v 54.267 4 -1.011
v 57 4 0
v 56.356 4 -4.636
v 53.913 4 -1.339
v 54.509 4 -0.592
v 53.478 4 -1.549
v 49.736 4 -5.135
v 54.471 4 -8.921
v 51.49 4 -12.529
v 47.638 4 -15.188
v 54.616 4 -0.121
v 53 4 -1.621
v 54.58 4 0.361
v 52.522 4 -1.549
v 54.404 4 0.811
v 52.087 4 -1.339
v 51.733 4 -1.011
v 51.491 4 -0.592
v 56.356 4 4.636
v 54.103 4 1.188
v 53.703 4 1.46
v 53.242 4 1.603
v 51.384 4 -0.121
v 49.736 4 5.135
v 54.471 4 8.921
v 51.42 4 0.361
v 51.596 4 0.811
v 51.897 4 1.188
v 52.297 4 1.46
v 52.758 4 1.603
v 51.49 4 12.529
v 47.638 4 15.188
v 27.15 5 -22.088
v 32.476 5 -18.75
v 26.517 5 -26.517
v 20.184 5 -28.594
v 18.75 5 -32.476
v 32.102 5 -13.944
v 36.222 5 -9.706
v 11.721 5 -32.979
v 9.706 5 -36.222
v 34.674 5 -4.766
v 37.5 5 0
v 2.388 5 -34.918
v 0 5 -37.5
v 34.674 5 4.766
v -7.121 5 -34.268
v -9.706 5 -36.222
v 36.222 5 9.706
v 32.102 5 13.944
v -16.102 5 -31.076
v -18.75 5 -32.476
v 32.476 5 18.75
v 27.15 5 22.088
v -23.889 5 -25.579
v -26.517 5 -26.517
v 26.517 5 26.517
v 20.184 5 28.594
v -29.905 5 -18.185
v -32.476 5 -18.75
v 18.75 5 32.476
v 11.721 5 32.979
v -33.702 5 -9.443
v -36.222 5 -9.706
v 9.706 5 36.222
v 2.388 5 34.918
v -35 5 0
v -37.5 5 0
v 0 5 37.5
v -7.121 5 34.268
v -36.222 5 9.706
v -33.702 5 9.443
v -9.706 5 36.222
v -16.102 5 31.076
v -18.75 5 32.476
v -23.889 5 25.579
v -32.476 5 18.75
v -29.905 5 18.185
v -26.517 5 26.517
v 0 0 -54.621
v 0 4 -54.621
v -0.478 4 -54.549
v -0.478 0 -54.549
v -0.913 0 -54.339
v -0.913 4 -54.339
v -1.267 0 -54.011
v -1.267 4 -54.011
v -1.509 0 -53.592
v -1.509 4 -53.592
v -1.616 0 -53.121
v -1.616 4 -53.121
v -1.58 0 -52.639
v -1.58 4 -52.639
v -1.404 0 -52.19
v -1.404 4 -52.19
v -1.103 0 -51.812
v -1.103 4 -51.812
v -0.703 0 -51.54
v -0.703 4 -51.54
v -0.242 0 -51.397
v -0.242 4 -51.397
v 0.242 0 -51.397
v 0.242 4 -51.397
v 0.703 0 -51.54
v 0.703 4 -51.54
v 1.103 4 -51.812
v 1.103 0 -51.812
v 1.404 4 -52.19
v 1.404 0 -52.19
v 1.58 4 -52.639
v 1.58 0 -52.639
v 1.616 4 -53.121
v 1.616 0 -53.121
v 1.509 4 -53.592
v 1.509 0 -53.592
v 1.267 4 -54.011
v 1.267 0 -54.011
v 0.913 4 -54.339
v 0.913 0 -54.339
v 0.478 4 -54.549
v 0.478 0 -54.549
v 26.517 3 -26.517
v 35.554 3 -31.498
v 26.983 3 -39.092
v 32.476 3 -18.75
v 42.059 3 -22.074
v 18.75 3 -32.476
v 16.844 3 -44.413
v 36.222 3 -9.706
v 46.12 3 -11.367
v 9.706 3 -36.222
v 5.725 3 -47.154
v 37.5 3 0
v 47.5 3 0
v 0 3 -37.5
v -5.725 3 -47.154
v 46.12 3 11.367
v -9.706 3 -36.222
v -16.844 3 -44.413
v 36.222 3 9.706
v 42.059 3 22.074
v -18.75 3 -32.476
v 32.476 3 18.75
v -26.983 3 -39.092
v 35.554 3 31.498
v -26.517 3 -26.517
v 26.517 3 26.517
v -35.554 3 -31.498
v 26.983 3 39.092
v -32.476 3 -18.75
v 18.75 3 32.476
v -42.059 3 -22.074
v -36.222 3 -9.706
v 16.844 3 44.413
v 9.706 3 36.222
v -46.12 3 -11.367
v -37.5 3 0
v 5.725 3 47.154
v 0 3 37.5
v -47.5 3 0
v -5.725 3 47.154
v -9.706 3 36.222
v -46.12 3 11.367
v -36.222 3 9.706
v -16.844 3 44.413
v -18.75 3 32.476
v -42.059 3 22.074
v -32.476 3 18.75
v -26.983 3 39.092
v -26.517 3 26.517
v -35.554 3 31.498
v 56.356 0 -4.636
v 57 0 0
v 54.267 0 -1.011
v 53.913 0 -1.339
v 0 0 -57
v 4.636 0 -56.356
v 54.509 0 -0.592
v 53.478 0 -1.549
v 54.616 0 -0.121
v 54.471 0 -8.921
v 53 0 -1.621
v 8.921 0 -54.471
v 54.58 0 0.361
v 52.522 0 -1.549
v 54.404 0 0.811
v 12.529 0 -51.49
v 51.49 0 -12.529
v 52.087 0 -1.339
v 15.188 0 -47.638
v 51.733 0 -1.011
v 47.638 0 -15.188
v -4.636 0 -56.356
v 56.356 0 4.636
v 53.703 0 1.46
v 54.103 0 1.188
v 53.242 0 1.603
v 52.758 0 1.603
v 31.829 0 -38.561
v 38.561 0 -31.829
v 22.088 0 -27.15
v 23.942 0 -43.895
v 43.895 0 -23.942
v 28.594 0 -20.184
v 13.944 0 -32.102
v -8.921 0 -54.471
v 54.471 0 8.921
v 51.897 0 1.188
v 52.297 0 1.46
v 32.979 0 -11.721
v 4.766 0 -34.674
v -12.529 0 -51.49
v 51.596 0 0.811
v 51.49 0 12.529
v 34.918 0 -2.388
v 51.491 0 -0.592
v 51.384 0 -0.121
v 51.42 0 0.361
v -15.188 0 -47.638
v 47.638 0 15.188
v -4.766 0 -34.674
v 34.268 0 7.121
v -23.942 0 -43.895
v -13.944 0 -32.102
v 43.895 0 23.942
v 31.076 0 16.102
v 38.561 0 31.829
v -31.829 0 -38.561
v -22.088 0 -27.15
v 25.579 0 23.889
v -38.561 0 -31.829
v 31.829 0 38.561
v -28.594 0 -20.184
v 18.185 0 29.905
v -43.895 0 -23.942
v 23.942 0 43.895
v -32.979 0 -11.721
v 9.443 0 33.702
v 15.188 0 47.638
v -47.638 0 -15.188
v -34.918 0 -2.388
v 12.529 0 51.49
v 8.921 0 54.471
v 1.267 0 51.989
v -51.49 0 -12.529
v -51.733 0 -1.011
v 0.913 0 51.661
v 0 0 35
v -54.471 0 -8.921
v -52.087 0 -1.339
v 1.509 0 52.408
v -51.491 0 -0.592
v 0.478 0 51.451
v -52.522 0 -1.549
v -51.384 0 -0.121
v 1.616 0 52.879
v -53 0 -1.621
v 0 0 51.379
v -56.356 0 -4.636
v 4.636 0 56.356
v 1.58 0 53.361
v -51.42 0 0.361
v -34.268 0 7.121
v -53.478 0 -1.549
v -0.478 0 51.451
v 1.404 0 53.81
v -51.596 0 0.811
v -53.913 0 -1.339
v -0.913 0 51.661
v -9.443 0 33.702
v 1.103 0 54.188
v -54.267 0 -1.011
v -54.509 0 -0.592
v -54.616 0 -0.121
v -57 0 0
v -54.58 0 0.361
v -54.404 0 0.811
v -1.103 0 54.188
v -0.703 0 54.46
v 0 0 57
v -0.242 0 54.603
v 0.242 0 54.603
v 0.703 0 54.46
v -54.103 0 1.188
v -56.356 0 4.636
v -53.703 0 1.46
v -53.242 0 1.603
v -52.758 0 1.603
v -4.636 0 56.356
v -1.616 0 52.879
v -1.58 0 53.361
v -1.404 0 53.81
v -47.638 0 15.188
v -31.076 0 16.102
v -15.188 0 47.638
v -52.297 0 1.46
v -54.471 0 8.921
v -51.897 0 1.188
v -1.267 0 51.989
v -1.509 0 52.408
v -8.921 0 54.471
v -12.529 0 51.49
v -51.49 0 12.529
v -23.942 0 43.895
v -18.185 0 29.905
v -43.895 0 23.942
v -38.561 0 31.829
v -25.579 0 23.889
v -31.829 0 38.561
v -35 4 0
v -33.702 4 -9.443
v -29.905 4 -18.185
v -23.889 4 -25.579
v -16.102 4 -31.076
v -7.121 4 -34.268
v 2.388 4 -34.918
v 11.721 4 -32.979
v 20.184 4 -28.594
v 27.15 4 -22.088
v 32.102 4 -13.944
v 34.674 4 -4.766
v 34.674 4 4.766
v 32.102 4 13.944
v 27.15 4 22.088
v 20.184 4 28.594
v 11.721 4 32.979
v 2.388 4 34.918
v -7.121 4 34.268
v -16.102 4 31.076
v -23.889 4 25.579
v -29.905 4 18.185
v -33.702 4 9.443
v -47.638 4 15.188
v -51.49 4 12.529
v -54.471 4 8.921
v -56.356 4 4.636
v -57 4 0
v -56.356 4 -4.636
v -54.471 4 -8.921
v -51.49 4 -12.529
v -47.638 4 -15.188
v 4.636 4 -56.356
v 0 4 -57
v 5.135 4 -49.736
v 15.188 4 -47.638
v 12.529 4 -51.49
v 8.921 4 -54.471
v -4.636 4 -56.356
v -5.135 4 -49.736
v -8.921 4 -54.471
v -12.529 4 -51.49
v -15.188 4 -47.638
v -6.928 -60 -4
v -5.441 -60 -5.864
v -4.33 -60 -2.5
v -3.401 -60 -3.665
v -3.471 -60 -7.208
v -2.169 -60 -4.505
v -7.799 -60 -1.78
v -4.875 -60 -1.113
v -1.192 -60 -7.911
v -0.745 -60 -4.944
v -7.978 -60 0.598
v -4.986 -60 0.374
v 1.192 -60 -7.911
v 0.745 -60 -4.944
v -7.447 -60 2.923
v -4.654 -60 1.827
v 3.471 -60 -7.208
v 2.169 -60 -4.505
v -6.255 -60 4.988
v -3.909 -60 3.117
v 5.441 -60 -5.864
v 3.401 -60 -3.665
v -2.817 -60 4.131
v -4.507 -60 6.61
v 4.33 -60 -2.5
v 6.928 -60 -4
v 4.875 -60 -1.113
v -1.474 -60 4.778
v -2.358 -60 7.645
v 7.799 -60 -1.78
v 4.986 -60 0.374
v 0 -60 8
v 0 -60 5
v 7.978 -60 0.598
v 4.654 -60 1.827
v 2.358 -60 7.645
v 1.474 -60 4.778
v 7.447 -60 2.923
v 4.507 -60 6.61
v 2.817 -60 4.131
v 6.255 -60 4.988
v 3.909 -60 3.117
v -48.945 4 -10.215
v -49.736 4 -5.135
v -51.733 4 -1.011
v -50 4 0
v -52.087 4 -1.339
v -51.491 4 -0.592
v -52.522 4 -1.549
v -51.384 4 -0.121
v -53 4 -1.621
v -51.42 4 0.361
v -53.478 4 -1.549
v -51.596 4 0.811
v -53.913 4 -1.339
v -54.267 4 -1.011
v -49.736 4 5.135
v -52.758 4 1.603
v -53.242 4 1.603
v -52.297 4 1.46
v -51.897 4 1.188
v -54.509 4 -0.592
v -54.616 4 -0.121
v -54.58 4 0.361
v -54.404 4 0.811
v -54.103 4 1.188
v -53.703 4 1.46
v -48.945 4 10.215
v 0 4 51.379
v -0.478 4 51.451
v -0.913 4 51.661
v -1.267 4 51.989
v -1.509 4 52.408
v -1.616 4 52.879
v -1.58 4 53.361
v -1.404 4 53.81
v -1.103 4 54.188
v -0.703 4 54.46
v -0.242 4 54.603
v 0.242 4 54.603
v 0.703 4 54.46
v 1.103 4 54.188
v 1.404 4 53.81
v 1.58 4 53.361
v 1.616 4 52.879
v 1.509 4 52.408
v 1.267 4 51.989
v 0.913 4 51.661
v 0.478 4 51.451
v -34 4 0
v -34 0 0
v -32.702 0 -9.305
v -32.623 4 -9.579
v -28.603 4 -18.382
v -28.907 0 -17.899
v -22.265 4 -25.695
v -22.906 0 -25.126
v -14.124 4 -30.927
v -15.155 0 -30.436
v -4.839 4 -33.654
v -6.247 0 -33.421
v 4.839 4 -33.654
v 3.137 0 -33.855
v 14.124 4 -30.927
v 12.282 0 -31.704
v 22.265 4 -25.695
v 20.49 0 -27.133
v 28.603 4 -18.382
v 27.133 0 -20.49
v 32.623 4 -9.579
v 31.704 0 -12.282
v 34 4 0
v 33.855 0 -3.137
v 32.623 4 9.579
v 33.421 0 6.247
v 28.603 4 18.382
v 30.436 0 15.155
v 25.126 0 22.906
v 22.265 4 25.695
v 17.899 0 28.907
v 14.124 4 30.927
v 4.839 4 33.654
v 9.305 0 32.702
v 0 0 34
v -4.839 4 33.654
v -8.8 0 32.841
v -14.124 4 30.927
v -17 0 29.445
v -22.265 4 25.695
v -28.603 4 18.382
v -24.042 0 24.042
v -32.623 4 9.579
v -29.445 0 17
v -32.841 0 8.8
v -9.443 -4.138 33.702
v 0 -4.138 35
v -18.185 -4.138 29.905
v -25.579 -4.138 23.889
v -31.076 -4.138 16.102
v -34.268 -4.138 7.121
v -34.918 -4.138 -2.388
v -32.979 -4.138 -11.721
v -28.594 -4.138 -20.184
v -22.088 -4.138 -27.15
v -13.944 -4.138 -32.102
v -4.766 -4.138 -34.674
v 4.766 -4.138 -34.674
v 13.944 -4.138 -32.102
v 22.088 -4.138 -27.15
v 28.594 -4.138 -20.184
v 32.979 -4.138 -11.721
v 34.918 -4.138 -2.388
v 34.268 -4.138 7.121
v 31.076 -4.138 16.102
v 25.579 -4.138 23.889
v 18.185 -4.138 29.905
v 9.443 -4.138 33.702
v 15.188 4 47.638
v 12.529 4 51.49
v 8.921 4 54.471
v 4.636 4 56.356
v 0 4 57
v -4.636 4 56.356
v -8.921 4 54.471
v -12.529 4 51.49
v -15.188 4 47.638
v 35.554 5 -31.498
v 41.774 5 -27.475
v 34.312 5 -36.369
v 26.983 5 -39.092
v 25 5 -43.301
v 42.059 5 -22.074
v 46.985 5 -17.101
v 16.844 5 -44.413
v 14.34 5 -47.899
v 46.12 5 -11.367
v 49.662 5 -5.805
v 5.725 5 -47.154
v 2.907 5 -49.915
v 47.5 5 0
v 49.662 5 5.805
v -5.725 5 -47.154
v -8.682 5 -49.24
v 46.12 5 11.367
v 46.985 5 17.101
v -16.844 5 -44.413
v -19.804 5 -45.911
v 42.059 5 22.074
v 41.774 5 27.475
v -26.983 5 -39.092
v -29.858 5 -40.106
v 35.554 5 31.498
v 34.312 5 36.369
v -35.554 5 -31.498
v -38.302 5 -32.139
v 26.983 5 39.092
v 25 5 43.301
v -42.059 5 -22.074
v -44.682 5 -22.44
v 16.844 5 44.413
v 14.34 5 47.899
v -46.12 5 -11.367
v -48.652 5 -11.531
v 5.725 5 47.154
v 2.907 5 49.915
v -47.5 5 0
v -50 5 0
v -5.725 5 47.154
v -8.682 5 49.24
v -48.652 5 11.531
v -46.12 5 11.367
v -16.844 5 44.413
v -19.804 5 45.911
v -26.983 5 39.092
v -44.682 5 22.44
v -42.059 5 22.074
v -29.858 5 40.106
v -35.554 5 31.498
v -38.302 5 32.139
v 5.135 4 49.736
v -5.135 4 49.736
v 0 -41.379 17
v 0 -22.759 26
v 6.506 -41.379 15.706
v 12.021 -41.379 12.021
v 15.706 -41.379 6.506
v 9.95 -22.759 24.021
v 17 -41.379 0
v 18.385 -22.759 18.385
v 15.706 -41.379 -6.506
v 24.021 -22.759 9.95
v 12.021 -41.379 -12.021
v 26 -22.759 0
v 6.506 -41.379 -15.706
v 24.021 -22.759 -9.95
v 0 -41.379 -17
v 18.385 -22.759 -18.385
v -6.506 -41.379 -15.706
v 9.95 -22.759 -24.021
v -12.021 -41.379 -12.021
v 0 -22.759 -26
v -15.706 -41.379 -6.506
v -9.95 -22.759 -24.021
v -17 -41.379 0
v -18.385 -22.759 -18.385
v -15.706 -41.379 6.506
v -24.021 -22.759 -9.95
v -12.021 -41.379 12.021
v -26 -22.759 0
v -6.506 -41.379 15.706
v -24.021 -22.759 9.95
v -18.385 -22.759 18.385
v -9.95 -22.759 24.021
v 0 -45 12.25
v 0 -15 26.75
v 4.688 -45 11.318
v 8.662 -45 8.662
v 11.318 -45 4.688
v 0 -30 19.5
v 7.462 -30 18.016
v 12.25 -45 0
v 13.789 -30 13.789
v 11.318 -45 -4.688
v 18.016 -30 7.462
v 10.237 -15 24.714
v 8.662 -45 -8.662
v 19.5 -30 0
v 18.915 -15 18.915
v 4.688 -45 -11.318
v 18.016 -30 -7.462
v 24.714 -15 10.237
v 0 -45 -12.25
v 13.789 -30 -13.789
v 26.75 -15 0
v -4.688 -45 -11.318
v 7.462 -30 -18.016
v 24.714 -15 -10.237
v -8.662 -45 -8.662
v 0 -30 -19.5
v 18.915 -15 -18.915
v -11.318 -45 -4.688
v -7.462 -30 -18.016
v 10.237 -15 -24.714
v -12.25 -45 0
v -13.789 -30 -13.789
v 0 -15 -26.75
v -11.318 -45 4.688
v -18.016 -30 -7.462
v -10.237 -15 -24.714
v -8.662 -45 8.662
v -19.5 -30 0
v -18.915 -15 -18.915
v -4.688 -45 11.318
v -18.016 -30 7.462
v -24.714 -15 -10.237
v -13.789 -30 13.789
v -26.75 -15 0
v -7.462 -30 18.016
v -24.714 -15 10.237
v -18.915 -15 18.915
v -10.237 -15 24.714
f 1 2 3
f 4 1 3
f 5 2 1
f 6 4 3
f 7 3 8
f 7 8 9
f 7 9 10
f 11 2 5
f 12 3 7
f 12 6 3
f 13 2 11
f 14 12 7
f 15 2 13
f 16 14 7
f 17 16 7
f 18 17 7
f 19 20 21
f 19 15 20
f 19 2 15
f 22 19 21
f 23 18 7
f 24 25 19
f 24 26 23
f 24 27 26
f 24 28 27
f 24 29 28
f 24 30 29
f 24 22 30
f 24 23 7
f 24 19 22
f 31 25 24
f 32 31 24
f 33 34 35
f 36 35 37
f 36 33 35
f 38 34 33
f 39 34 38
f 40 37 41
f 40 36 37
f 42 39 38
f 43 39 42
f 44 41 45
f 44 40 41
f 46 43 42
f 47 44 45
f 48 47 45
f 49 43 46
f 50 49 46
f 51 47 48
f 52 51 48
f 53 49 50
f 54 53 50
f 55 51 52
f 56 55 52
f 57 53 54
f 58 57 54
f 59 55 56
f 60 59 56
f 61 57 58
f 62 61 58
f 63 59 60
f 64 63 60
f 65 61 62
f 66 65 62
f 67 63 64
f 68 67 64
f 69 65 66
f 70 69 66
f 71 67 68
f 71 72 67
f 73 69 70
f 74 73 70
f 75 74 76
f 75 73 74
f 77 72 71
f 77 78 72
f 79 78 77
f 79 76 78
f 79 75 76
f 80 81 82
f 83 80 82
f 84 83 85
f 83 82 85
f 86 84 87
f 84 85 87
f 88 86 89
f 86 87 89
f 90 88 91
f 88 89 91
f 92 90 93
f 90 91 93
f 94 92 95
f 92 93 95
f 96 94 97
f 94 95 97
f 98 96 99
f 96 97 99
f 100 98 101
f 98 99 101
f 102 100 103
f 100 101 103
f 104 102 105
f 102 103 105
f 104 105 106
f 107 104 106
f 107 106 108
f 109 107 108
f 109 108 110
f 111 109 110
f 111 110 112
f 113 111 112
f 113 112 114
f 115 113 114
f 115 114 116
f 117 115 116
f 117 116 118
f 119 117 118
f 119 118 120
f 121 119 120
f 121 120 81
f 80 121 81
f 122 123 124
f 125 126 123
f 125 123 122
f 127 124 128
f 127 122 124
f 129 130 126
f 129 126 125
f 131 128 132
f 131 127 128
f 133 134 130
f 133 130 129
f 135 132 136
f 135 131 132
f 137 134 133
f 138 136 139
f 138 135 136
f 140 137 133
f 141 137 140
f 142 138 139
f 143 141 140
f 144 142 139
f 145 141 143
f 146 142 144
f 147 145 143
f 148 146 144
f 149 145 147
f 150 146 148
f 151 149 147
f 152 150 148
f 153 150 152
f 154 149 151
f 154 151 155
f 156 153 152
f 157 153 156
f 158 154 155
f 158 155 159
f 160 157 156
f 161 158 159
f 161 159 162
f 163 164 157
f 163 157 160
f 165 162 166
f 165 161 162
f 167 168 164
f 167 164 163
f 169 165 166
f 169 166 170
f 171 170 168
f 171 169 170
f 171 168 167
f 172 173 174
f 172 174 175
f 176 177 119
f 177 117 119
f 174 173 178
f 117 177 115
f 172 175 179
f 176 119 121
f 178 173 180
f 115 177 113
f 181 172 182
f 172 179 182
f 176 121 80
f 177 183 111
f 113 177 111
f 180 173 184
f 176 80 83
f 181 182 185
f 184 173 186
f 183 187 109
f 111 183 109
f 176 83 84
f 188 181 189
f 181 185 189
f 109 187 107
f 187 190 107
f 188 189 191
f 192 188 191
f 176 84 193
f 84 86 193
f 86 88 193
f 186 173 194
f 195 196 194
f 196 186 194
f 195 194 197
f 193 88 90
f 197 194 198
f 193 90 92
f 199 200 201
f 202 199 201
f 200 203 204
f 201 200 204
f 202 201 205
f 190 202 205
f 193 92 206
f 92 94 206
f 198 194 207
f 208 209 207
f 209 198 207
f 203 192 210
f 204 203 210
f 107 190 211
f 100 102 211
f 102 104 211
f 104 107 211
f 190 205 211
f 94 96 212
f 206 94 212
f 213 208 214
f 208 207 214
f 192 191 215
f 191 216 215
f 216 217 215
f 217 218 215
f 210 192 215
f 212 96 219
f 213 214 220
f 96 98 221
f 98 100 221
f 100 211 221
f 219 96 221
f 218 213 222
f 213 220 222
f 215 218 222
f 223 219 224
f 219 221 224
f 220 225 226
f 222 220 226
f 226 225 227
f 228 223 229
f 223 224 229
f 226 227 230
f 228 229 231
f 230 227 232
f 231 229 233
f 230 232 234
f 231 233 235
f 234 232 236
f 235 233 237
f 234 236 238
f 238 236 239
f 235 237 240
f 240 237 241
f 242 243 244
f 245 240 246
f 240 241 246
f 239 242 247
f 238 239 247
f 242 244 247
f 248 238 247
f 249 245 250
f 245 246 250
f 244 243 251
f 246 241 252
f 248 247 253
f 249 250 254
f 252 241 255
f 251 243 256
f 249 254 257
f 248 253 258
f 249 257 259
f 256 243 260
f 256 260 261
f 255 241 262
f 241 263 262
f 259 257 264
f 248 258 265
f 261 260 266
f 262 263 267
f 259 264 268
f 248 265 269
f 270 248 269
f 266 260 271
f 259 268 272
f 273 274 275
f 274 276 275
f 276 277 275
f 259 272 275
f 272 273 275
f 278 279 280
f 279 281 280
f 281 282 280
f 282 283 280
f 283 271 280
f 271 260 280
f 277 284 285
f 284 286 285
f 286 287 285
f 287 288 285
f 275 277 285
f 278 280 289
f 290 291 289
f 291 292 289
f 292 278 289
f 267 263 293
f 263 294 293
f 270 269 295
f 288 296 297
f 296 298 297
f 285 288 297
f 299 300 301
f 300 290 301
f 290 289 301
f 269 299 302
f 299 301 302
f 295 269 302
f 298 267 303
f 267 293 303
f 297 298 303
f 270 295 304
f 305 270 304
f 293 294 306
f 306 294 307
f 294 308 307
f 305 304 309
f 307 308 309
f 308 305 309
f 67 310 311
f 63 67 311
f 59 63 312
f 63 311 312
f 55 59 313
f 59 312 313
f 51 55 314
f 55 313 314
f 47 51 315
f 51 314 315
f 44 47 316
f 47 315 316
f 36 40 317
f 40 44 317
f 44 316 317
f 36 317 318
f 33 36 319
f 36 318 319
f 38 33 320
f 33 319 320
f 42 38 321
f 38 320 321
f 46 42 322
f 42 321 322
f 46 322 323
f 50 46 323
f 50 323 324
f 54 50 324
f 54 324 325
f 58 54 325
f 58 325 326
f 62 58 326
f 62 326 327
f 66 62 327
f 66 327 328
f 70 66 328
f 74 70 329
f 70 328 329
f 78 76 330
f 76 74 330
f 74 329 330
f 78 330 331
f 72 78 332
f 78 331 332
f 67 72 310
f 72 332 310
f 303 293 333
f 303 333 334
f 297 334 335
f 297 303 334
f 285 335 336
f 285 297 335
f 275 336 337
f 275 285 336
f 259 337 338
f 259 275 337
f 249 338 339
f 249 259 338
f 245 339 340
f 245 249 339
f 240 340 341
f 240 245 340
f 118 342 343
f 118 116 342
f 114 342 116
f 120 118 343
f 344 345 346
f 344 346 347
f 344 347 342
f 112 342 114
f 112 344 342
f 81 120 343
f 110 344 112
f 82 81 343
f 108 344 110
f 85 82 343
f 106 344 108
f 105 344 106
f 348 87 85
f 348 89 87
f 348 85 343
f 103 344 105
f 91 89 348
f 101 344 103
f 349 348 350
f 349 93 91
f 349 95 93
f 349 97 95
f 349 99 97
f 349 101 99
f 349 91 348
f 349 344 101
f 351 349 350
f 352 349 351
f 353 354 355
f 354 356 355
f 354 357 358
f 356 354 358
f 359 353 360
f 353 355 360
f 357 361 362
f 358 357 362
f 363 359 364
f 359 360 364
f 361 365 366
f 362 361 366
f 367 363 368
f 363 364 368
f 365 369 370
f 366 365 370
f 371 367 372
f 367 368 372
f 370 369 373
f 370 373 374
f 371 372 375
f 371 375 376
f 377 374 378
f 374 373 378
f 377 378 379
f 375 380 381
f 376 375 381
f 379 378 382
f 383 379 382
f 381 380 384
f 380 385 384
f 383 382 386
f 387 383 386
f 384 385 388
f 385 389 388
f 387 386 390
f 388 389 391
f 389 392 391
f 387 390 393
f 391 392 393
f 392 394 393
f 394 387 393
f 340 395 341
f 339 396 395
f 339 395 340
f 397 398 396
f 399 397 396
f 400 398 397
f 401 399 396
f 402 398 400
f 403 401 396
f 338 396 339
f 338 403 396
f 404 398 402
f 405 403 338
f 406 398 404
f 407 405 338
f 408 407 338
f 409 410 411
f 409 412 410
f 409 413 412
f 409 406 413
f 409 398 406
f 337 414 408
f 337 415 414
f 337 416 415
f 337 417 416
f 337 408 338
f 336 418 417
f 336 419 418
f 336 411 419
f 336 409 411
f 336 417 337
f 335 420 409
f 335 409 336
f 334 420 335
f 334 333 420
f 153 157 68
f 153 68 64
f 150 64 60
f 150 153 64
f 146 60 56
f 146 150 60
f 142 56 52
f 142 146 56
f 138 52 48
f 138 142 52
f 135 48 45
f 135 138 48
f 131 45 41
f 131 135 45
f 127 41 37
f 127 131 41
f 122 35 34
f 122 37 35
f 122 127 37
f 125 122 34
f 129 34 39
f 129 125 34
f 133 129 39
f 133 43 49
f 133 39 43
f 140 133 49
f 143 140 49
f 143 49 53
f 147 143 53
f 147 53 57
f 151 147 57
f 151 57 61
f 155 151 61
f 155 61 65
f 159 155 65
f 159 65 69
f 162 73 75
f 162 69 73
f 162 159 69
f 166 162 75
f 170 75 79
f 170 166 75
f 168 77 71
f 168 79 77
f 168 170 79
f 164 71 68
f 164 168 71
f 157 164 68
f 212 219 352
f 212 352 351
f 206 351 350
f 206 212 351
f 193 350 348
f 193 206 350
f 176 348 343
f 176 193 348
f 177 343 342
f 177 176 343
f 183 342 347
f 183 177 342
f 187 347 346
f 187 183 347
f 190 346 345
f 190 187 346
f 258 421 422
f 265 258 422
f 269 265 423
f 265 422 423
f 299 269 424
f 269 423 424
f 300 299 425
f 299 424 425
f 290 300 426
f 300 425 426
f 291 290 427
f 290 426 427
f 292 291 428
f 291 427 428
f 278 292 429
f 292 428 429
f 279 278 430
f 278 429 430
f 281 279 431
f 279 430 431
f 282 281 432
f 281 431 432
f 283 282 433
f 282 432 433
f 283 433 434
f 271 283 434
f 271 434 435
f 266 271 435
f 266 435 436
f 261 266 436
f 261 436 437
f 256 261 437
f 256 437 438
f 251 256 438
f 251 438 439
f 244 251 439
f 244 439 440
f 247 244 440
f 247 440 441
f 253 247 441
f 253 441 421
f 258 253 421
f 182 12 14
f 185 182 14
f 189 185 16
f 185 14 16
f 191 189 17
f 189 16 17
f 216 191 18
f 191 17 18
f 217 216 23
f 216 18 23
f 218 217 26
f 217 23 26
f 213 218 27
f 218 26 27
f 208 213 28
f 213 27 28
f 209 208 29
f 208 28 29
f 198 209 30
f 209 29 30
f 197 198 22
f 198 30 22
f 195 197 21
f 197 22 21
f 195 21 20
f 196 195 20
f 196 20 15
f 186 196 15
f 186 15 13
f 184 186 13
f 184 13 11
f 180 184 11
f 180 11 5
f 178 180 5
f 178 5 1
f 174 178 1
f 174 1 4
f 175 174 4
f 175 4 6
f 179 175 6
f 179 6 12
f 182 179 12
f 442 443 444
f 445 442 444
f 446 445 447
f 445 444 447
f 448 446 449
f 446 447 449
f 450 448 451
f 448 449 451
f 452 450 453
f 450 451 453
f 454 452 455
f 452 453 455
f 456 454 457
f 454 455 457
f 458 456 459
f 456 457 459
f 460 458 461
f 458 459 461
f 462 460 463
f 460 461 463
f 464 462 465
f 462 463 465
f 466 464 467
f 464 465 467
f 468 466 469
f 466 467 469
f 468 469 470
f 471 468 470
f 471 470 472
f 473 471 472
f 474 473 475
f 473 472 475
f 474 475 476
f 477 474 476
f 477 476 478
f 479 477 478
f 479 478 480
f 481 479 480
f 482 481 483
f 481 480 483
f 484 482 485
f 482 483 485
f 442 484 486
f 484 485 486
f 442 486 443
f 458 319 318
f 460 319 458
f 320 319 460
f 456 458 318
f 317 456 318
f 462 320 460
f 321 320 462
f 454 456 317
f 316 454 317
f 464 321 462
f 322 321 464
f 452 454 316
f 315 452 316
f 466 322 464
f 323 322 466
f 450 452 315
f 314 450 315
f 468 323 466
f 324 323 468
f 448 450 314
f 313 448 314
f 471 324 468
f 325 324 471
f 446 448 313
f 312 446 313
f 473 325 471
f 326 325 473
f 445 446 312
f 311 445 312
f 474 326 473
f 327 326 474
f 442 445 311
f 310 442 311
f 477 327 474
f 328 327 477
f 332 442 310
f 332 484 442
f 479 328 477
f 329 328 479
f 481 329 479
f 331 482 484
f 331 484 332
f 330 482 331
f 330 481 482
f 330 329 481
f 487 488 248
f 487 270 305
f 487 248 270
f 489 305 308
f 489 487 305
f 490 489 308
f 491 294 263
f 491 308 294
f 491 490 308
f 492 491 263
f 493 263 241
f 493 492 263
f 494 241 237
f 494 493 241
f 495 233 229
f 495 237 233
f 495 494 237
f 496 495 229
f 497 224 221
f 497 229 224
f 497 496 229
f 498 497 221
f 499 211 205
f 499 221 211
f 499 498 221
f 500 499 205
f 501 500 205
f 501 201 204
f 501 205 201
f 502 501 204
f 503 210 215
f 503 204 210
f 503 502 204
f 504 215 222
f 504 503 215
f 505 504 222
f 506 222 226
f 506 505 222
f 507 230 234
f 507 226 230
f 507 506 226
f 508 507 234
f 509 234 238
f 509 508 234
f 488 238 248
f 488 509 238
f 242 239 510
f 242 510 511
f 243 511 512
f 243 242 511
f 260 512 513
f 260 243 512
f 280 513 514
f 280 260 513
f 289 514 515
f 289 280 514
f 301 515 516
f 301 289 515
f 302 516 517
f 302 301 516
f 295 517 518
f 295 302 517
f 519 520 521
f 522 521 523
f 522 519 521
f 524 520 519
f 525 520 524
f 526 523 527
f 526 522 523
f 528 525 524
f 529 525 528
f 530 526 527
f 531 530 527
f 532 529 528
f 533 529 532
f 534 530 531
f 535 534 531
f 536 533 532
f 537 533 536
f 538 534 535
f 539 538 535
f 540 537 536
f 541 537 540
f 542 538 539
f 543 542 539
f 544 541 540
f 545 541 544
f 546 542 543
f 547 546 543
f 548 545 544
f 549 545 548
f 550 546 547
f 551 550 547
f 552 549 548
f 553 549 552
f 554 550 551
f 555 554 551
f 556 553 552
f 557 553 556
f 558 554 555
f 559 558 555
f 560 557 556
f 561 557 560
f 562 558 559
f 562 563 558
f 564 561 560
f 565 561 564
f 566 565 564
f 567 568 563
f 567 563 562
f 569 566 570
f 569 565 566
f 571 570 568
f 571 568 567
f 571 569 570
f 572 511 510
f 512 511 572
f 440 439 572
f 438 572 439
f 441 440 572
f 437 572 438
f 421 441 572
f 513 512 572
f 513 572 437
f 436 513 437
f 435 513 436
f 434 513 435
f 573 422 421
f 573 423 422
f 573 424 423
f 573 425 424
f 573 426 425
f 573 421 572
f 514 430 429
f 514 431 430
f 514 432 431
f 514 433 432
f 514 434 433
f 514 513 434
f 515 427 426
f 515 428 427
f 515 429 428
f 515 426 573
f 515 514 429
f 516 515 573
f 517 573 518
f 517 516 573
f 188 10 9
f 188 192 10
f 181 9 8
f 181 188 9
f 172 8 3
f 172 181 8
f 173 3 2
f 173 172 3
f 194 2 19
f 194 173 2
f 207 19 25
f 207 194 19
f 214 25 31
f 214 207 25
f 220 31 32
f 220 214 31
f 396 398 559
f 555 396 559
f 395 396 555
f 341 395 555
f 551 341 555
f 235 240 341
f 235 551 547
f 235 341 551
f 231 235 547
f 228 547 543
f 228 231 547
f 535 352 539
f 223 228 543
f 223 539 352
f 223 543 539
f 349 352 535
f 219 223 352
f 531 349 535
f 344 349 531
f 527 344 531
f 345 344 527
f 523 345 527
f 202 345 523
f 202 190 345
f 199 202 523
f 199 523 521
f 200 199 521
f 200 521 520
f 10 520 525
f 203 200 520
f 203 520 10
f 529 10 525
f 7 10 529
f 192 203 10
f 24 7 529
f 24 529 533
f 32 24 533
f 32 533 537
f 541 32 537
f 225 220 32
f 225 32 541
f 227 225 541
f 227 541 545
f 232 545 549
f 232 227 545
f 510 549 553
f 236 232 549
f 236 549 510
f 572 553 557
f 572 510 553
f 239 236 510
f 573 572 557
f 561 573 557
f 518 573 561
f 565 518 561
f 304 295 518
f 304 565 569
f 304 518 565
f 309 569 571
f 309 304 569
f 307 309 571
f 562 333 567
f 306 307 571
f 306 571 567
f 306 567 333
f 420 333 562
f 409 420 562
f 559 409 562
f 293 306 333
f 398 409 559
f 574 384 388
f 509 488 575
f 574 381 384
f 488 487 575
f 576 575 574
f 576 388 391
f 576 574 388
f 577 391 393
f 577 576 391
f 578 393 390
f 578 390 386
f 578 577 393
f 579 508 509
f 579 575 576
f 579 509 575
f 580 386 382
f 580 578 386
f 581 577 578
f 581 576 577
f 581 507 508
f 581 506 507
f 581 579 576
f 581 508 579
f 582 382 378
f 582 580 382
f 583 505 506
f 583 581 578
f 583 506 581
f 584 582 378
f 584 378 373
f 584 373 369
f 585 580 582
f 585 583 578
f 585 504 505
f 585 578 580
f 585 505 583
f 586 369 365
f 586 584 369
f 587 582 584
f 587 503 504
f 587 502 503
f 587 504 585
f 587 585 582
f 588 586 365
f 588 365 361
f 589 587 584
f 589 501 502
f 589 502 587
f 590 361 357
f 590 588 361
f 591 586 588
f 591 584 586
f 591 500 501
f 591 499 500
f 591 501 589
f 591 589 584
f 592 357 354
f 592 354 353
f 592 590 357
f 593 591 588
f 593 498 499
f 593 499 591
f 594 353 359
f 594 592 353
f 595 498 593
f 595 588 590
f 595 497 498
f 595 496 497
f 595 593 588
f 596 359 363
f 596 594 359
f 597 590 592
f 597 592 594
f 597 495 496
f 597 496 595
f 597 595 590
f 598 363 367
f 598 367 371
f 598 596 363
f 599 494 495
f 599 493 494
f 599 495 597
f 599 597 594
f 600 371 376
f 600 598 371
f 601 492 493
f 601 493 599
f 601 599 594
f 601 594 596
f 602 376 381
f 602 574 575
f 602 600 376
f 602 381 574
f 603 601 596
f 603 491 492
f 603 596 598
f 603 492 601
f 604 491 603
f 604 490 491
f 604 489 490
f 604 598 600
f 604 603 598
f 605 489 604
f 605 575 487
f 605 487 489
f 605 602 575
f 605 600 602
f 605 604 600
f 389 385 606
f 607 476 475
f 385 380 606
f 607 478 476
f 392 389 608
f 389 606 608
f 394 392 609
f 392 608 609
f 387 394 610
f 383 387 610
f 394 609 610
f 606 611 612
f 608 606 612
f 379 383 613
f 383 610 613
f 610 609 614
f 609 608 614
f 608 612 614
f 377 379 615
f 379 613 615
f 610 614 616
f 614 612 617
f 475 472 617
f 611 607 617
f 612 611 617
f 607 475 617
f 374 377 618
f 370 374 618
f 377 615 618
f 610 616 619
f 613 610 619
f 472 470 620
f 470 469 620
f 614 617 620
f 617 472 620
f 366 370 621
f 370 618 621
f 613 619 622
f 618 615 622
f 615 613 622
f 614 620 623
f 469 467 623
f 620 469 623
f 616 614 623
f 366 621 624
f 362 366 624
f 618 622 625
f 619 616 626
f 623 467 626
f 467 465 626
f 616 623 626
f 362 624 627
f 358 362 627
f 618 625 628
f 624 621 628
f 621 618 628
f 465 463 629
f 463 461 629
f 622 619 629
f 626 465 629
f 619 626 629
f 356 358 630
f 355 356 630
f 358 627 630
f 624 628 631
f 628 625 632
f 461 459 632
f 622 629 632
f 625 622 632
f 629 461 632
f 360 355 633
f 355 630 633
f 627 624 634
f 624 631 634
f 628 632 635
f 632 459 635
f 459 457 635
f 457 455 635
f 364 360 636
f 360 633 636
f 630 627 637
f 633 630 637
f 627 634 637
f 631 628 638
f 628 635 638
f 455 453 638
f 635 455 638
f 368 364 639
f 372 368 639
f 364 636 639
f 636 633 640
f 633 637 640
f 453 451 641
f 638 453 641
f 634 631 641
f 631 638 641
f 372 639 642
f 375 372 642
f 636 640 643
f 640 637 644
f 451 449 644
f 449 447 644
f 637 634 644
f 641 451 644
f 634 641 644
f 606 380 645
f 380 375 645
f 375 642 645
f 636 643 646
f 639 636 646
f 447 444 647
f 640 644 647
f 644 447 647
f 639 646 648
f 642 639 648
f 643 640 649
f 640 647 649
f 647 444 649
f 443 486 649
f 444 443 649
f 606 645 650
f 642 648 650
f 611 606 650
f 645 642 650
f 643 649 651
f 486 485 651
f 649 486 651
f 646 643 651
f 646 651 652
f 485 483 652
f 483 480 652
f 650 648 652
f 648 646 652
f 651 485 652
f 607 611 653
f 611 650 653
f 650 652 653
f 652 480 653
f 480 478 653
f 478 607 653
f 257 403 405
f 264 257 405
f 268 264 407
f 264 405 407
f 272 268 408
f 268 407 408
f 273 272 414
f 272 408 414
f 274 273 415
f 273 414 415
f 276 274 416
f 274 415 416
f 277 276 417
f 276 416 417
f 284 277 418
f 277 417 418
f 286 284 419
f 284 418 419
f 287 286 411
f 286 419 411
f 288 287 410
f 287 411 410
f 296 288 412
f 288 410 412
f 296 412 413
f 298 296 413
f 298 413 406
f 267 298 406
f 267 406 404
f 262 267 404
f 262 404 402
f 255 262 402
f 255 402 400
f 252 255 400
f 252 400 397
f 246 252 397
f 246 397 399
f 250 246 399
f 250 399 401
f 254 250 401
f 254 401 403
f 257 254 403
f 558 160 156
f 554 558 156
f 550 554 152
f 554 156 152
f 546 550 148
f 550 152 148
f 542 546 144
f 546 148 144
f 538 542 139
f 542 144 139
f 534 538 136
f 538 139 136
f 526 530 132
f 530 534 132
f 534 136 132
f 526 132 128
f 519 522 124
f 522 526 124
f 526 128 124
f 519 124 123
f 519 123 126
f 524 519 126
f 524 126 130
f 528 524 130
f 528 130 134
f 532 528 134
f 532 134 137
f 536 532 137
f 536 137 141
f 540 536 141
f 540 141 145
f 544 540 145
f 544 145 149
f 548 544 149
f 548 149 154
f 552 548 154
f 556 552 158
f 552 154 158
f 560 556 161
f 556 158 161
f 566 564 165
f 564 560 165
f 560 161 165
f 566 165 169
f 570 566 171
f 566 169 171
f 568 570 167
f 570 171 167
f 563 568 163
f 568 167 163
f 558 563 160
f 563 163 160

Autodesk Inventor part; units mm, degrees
ref_plane "YZ Plane" through (0, 0, 0) normal (1, 0, 0) x (0, 1, 0)
ref_plane "XZ Plane" through (0, 0, 0) normal (0, 1, 0) x (-1, 0, 0)
ref_plane "XY Plane" through (0, 0, 0) normal (0, 0, 1) x (1, 0, 0)
sketch "Sketch1" plane through (0, 0, 0) normal (0, 1, 0) x (-1, 0, 0)
  circle A0 centre (0, 0) radius 35
  circle A1 centre (0, 0) radius 34
  circle A2 centre (0, 0) radius 37.5
  circle A3 centre (0, 0) radius 50
  circle A4 centre (0, 0) radius 47.5
  arc A5 (47.6375, -15.1878) -> (47.6375, 15.1878) centre (40, 0) ccw
  arc A6 (15.1878, 47.6375) -> (-15.1878, 47.6375) centre (0, 40) ccw
  arc A7 (-47.6375, 15.1878) -> (-47.6375, -15.1878) centre (-40, 0) ccw
  arc A8 (-15.1878, -47.6375) -> (15.1878, -47.6375) centre (0, -40) ccw
  point P0 (-15.1878, -47.6375)
  point P1 (-47.6375, -15.1878)
  point P2 (-47.6375, 15.1878)
  point P3 (-15.1878, 47.6375)
  point P4 (0, 53)
  point P5 (-53, 0)
  point P6 (-40, 0)
  point P7 (0, -53)
  point P8 (53, 0)
  point P9 (40, 0)
  dimension "d6" = 70
  dimension "d7" = 68
  dimension "d8" = 75
  dimension "d11" = 10
  dimension "d12" = 2.5
  dimension "d13" = 17
  dimension "d14" = 40
  dimension "d17" = 360
  dimension "d27" = 13
  dimension "d30" = 360
extrude "Extrusion1" add sketch "Sketch1" along normal blind 5 contours A2 | A3
extrude "Extrusion2" add sketch "Sketch1" along normal blind 3 contours A4
extrude "Extrusion3" add sketch "Sketch1" along normal blind 4 contours A3 A5 | A3 A6 | A8 A3 | A3 A7
extrude "Extrusion4" add sketch "Sketch1" along normal blind 4 contours A0
hole "Hole1" at (0, 0, 53) at (53, 0, 0) at (0, 0, -53) at (-53, 0, 0) direction (0, 1, 0) diameter 3.242 depth 11.8 thread size "M4x0.7" class "6H" standard "ANSI Metric M Profile"
sketch "Sketch2" plane through (0, 0, 0) normal (1, 0, 0) x (0, 1, 0)
  line L0 (0, 0) -> (0, 34)
  line L1 (0, 15.1878) -> (0, 47.6375) projected
  line L2 (0, 34) -> (0, 35)
  line L3 (0, 35) -> (-60, 35)
  line L4 (-60, 35) -> (-60, 5)
  line L5 (-60, 5) -> (0, 34)
  line L6 (-60, 8) -> (-4.1379, 35)
  line L7 (-4.1379, 35) -> (0, 37)
  line L8 (-72, 0) -> (12, 0) projected
  dimension "d39" = 34
  dimension "d40" = 1
  dimension "d41" = 60
  dimension "d42" = 30
  dimension "d43" = 3
  dimension "d44" = 3
revolve "Revolution1" add sketch "Sketch2" angle 360 about axis through (0, -10, 0) along (0, 1, 0) contours L5 L4 L6 L3 L1
properties part number "LilghtPointLensHolder"
